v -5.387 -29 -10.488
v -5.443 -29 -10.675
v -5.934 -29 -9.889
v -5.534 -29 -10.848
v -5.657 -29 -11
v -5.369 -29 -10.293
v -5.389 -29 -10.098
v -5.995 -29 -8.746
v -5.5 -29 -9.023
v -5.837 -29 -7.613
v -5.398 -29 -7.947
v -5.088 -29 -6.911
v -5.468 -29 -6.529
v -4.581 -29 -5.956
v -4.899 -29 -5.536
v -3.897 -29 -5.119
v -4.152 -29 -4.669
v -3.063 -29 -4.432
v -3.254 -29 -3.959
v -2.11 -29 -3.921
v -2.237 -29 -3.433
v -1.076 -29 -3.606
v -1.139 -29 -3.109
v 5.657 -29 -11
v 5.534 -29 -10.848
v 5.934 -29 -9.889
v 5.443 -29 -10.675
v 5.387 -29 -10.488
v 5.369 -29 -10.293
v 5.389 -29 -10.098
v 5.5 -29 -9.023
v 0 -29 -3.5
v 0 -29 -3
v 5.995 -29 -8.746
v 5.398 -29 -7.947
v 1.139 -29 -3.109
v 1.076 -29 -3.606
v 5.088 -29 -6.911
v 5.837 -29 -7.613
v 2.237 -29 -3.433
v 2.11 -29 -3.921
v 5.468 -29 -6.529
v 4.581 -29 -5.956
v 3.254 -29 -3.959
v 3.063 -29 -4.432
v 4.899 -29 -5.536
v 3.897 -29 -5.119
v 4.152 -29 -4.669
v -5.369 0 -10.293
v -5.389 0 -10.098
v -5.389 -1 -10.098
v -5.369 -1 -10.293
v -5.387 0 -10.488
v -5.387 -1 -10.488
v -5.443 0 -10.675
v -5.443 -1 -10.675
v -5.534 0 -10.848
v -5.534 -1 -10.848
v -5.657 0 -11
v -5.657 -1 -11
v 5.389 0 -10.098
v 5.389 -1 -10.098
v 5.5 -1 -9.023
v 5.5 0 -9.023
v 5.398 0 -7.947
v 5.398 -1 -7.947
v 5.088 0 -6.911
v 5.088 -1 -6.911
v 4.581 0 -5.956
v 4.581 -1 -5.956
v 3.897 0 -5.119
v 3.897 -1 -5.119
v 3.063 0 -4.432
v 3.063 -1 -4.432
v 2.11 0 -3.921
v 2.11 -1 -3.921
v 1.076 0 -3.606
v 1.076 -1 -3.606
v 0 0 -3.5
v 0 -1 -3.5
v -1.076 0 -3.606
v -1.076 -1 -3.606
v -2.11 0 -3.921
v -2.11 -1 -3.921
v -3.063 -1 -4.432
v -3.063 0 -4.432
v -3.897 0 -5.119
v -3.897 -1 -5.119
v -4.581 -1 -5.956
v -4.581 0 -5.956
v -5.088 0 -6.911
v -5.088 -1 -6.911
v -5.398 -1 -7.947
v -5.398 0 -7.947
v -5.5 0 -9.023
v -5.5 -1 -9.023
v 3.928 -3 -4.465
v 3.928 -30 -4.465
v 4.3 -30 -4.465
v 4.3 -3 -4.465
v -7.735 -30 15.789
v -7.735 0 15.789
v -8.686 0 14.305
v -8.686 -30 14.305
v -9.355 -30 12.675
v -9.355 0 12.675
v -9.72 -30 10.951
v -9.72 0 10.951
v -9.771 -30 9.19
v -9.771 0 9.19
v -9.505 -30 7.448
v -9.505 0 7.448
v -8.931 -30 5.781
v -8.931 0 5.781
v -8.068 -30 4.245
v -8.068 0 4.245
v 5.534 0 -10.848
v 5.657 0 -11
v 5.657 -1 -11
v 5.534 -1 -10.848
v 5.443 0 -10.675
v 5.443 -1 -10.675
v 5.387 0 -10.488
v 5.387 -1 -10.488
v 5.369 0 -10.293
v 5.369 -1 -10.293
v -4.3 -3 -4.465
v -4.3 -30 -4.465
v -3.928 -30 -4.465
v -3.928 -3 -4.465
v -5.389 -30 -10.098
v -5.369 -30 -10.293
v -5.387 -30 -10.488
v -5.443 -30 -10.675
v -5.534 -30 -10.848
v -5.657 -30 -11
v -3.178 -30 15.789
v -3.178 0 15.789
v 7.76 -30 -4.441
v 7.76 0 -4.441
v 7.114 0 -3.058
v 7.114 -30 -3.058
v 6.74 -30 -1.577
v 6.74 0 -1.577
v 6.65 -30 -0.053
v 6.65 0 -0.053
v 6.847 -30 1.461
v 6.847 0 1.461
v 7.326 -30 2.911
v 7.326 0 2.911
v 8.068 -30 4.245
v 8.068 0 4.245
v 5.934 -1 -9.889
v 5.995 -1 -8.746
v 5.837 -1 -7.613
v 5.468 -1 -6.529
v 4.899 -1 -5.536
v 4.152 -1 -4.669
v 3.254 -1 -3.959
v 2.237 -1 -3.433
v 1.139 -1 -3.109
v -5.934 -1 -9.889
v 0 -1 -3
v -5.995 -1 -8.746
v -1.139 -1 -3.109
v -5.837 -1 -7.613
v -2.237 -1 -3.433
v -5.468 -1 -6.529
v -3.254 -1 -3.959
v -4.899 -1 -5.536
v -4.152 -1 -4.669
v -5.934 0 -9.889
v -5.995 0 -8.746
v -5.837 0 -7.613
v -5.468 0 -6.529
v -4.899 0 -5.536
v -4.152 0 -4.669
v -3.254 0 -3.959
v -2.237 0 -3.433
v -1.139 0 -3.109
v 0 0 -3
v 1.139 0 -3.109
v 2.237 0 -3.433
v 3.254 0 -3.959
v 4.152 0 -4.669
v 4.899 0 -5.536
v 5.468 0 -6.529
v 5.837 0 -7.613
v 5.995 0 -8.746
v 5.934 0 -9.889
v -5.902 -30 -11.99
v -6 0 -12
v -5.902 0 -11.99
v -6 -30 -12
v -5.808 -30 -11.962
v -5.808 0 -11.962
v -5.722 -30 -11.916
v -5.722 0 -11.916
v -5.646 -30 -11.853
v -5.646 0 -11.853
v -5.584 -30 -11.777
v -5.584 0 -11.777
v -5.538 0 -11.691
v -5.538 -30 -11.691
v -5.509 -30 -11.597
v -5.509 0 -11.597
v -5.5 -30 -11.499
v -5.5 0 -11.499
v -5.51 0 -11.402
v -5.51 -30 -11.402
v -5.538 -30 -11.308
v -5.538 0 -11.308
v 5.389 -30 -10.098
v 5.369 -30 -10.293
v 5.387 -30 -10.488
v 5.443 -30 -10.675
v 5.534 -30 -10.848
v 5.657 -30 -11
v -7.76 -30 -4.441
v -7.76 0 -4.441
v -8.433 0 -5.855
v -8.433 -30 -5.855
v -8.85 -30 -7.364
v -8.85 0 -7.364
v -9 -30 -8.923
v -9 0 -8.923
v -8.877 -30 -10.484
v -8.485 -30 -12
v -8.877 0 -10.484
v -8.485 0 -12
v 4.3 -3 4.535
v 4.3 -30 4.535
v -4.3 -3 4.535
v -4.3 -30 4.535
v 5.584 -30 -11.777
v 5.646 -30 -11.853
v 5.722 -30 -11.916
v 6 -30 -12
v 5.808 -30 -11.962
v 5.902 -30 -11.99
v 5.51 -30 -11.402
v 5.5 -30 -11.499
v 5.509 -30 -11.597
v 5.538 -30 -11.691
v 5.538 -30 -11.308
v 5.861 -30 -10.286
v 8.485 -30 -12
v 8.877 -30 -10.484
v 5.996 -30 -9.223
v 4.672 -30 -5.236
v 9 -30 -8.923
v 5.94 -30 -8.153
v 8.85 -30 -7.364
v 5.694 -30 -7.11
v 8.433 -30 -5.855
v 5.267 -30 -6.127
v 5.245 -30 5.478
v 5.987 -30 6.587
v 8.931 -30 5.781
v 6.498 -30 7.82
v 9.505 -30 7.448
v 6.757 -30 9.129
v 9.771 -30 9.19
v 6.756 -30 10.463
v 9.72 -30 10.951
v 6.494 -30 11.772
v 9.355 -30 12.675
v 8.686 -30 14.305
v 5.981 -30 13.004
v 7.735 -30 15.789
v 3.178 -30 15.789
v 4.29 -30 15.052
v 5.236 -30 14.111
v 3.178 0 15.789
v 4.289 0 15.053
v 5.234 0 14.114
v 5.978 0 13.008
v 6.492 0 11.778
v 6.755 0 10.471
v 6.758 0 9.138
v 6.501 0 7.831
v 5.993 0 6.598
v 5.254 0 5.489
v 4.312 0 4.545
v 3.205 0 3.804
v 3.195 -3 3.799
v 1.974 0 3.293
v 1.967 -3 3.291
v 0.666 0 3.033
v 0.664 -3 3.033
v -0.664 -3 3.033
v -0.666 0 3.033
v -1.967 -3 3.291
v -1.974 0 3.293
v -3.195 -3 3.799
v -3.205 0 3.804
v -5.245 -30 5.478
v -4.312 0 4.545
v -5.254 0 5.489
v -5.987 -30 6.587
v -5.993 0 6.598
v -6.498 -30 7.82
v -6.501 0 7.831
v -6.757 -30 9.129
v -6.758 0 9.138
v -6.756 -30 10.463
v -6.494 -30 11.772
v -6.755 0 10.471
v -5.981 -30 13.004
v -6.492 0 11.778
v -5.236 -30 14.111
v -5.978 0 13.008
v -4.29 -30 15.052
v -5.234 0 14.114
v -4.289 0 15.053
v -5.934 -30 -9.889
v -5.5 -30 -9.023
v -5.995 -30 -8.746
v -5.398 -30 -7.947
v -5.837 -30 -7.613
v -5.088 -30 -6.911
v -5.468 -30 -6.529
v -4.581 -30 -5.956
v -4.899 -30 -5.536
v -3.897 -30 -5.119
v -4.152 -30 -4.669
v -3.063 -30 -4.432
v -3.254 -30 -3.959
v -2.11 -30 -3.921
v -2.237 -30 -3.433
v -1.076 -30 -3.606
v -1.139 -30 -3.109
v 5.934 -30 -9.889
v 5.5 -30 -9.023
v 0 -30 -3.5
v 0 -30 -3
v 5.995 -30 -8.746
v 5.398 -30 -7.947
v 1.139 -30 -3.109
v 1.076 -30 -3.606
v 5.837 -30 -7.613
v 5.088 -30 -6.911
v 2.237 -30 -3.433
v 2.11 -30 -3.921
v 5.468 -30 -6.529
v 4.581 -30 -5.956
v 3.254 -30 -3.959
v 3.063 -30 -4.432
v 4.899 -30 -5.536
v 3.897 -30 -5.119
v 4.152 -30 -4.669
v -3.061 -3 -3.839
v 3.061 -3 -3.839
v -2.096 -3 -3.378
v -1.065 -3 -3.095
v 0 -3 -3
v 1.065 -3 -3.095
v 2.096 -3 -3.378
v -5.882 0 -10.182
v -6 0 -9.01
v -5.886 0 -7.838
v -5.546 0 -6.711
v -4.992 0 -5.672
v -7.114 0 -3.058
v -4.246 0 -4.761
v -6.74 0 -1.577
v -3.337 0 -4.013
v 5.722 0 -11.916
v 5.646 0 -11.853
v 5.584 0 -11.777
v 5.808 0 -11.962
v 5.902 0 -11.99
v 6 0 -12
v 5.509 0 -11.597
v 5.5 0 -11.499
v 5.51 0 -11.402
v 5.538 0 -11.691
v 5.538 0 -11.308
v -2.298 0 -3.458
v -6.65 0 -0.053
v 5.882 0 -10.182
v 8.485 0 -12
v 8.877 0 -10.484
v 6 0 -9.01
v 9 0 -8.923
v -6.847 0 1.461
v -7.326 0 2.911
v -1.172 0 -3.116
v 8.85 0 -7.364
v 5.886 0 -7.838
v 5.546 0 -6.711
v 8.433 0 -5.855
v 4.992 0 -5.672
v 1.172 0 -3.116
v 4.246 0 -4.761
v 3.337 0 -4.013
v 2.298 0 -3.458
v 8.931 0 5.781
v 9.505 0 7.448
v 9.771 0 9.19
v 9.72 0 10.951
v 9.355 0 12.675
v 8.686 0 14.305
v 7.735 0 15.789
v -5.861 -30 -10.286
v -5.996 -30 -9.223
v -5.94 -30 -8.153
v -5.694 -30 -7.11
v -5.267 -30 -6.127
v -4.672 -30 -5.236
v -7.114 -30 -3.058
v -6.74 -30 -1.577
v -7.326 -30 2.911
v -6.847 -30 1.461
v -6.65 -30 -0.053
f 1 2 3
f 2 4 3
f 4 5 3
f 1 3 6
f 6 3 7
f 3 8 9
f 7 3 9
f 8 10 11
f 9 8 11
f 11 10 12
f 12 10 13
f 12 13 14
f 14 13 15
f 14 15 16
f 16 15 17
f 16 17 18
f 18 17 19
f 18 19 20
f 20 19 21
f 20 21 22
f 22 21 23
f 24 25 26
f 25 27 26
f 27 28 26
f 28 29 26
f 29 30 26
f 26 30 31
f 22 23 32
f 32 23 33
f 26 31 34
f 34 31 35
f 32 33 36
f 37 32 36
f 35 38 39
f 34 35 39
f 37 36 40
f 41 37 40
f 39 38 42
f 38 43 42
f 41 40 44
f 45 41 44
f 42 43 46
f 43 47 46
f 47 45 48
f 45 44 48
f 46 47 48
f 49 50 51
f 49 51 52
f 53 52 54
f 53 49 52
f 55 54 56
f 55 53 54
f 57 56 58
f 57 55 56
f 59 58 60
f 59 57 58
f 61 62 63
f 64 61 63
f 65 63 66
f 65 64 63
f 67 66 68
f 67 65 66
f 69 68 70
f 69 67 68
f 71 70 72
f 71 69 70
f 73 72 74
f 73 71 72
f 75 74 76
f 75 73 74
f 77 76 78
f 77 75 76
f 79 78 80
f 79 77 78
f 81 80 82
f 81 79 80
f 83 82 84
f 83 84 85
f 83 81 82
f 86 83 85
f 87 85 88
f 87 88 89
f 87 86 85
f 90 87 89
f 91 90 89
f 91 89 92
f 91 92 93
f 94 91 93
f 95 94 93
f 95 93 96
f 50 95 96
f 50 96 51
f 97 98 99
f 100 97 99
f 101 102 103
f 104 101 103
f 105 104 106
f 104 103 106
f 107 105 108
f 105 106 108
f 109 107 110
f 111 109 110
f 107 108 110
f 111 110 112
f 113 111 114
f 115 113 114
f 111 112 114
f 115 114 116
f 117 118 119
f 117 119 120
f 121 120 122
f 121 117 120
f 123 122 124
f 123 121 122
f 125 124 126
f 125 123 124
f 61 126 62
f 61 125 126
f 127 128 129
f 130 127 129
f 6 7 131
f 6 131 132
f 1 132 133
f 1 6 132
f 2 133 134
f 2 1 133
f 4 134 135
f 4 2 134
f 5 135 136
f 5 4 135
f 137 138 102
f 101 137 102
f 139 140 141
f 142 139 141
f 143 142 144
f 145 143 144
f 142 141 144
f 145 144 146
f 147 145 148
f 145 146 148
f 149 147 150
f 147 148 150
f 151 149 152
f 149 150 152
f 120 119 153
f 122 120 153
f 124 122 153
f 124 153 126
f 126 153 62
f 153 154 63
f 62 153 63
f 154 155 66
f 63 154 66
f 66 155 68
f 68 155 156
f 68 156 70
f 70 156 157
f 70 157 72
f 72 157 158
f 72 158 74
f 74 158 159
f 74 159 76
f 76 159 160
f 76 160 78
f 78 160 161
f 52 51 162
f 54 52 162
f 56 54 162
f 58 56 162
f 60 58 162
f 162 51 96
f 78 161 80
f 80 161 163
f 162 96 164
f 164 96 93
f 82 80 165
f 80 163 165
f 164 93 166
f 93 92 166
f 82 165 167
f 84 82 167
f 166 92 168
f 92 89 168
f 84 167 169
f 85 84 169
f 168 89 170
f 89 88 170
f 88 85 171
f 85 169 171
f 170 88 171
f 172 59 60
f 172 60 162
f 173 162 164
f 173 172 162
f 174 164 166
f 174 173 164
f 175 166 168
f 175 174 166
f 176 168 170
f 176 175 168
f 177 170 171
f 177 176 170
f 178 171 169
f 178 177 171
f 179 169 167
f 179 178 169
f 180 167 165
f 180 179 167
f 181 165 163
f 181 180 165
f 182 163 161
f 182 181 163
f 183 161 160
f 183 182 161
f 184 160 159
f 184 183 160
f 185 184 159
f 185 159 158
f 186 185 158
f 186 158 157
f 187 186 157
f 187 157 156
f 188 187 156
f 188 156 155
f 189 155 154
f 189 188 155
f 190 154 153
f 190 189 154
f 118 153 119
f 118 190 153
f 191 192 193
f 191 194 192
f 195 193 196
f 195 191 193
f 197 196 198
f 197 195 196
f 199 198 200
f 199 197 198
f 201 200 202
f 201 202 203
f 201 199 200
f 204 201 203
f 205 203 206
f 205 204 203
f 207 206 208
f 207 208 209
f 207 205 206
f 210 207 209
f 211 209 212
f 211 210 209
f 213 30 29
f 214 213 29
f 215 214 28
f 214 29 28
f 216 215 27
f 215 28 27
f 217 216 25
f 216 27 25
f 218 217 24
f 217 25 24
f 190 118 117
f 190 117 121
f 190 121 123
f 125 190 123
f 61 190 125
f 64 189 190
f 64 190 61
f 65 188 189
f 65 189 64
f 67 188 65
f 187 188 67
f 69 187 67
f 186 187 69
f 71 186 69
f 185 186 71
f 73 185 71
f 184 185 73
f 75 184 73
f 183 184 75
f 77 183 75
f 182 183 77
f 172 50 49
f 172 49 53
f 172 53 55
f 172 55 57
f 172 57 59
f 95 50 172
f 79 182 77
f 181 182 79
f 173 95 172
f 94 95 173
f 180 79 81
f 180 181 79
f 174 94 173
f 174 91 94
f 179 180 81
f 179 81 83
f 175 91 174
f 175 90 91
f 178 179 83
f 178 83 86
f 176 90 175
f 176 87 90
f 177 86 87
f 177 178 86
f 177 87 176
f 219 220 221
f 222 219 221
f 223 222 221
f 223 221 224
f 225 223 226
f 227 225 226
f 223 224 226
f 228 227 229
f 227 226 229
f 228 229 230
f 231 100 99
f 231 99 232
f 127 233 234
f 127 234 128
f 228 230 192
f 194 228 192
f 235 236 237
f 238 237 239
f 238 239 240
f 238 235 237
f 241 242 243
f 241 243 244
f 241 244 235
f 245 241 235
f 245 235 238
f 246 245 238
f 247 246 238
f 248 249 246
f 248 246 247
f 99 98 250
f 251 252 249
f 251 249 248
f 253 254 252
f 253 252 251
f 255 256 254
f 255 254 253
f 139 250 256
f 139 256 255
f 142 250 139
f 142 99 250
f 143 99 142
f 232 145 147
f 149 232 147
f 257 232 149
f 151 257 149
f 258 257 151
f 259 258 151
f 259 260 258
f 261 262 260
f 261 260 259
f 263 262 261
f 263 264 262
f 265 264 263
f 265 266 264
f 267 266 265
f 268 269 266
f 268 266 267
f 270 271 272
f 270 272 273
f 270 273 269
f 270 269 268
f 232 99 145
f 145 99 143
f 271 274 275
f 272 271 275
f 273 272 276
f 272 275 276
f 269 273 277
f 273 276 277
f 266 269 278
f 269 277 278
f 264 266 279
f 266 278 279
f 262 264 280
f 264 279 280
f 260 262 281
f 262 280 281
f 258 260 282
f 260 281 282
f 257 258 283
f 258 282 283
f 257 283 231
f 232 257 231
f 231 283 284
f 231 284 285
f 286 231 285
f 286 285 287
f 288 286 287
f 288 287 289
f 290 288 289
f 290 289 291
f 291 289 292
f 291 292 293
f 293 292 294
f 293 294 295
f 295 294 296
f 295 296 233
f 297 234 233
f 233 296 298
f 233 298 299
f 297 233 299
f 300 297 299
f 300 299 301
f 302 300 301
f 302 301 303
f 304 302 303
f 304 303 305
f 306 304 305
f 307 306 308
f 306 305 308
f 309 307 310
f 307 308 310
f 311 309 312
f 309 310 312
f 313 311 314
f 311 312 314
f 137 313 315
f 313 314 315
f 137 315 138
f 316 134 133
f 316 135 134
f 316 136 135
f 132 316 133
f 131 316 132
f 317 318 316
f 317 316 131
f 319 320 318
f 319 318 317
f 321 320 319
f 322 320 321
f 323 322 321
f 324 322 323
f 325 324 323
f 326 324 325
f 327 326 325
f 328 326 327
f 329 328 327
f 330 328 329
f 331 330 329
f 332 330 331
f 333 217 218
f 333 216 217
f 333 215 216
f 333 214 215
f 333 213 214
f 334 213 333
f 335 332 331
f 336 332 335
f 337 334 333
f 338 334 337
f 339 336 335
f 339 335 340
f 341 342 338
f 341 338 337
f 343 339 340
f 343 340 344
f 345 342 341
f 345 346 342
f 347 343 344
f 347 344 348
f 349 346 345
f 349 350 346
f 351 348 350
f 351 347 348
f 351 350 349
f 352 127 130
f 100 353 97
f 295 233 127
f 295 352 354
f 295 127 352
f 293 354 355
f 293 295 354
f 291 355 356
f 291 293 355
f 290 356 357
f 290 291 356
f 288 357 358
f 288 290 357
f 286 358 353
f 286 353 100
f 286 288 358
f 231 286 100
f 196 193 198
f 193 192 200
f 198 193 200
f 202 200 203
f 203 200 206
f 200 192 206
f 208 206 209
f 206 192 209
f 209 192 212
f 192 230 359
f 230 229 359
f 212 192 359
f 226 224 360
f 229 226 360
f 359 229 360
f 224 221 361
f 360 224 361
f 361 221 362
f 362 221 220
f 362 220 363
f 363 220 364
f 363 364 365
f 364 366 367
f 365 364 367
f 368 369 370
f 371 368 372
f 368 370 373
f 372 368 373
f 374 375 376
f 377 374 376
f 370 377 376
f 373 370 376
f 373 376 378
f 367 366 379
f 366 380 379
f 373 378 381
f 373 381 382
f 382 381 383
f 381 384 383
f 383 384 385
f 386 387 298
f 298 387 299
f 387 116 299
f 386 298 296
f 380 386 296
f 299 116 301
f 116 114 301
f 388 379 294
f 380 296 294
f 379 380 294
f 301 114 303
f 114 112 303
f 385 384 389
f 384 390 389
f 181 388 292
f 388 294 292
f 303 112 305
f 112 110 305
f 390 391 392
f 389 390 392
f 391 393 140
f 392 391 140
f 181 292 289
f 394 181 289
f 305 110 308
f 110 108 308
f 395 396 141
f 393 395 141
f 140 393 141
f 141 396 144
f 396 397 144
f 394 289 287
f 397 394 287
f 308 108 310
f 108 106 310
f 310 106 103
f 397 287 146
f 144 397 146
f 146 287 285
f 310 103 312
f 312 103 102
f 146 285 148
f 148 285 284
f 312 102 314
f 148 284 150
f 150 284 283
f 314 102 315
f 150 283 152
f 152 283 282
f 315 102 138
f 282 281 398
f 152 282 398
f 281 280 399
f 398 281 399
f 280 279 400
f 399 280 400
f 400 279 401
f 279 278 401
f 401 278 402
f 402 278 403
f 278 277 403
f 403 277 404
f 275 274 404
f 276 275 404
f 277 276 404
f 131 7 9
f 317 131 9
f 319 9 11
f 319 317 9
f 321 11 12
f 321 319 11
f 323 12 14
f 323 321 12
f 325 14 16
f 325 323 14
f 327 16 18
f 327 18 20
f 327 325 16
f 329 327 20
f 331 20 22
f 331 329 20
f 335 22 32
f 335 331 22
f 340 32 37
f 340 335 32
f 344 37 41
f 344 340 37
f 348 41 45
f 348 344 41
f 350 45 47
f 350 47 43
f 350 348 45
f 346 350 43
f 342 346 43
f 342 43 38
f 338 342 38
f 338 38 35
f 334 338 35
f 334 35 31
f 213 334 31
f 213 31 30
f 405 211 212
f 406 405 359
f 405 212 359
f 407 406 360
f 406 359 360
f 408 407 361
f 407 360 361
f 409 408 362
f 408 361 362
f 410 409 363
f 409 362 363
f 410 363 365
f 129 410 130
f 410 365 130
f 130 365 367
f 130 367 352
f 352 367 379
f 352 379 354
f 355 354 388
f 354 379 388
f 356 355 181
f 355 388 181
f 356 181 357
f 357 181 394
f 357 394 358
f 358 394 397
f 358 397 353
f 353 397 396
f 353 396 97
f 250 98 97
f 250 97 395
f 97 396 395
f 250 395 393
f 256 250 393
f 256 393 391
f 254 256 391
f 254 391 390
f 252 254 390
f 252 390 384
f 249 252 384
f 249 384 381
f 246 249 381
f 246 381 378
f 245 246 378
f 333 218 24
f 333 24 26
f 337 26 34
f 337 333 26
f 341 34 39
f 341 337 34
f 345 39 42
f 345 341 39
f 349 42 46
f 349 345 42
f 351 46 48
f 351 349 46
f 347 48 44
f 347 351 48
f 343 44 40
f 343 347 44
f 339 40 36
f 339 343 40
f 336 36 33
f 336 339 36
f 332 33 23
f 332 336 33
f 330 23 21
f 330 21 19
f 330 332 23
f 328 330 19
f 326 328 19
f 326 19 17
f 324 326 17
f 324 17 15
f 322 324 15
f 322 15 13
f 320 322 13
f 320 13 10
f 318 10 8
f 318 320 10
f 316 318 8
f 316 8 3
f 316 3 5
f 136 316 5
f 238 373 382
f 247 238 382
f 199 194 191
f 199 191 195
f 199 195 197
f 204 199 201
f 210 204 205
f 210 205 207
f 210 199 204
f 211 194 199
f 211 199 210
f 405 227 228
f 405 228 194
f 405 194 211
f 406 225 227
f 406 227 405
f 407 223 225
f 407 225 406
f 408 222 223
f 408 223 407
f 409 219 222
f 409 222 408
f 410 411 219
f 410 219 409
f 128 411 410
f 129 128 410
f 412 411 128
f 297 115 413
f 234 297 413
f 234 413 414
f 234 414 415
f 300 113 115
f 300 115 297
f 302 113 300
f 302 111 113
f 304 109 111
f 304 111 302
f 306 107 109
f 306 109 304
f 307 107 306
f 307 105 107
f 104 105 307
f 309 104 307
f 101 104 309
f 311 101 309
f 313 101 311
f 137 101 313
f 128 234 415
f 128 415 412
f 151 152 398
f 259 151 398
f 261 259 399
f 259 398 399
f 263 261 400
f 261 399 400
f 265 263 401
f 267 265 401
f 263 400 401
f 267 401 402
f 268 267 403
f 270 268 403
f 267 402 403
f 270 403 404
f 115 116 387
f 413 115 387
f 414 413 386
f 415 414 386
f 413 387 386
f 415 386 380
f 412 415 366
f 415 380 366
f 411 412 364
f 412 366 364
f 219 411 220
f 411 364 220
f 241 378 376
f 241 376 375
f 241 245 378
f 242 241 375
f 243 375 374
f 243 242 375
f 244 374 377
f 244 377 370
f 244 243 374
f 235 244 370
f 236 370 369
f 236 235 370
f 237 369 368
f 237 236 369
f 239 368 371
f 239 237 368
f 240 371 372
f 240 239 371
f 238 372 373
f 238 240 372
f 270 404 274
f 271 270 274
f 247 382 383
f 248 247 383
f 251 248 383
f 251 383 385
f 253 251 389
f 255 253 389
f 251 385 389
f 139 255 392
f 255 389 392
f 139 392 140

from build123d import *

# Parameters (mm, degrees)
F1_DEPTH      = 30
F3_DEPTH      = 27
F5_DEPTH      = 1
F7_DEPTH      = 1
F8_T1_DEPTH   = 5.7000067135
F8_2_T1_DEPTH = 5.7000067135
F9_R          = 0.5


# Not quite as in the source:
# - a fillet or chamfer that OpenCascade refuses, or shapes differently, is made with other operations: its cross-section is extruded or revolved along the edge and cut away or added


with BuildPart() as f1:
    # F0 (on Front) → F1 (new body)
    with BuildSketch(Plane.XZ):
        with BuildLine():
            ThreePointArc((3.1776069014, 15.7894908219), (0, 3), (-3.1776069014, 15.7894908219))
            Line((-3.1776069014, 15.7894908219), (-7.7352524556, 15.7894908219))
            ThreePointArc((-7.7352524556, 15.7894908219), (-9.7854255442, 10.0715856127), (-8.0680556753, 4.245069466))
            ThreePointArc((-8.0680556753, 4.245069466), (-6.6495163105, -0.0531637642), (-7.7599288431, -4.4411071136))
            ThreePointArc((-7.7599288431, -4.4411071136), (-8.9588464195, -8.1403077112), (-8.4852813742, -12))
            Line((-8.4852813742, -12), (-5.1961524227, -12))
            ThreePointArc((-5.1961524227, -12), (0, -3), (5.1961524227, -12))
            Line((5.1961524227, -12), (8.4852813742, -12))
            ThreePointArc((8.4852813742, -12), (8.9588464195, -8.1403077112), (7.7599288431, -4.4411071136))
            ThreePointArc((7.7599288431, -4.4411071136), (6.6495163105, -0.0531637642), (8.0680556753, 4.245069466))
            ThreePointArc((8.0680556753, 4.245069466), (9.7854255442, 10.0715856127), (7.7352524556, 15.7894908219))
            Line((7.7352524556, 15.7894908219), (3.1776069014, 15.7894908219))
        make_face()
    extrude(amount=F1_DEPTH)

    # F2 (on face) → F3 (cut)
    with BuildSketch(Plane.XZ.offset(30)):
        with BuildLine():
            ThreePointArc((4.3, 4.535236772), (0, 3), (-4.3, 4.535236772))
            Line((-4.3, 4.535236772), (-4.3, -4.464763228))
            Line((-4.3, -4.464763228), (4.3, -4.464763228))
            Line((4.3, -4.464763228), (4.3, 4.535236772))
        make_face()
    extrude(amount=-F3_DEPTH, mode=Mode.SUBTRACT)

    # F9
    f9_edges = [f1.edges().sort_by_distance(p)[0] for p in [
        (5.196152, -15, -12),
        (-5.196152, -15, -12),
    ]]
    fillet(f9_edges, radius=F9_R)


with BuildPart() as f5:
    # F4 (on face) → F5 (new body)
    with BuildSketch(Plane.XZ.offset(30)):
        with BuildLine():
            Line((5.123475383, -11), (5.6568542495, -11))
            ThreePointArc((5.6568542495, -11), (0, -3), (-5.6568542495, -11))
            Line((-5.6568542495, -11), (-5.123475383, -11))
            ThreePointArc((-5.123475383, -11), (0, -3.5), (5.123475383, -11))
        make_face()
    extrude(amount=-F5_DEPTH)

    # F8: fillet of radius 1 on 2 edges, made by hand

    # F8_s2 → F8_t1 (cut)
    with BuildSketch(Plane.XZ.offset(26.6499966433)):
        with BuildLine():
            ThreePointArc((5.3892153407, -10.0983433031), (5.4104140841, -10.5826008761), (5.6568542495, -11))
            Line((5.6568542495, -11), (5.123475383, -11))
            ThreePointArc((5.123475383, -11), (5.2756433506, -10.5548592339), (5.3892153407, -10.0983433031))
        make_face()
        with BuildLine():
            ThreePointArc((-5.3892153407, -10.0983433031), (-5.4104140841, -10.5826008761), (-5.6568542495, -11))
            Line((-5.6568542495, -11), (-5.123475383, -11))
            ThreePointArc((-5.123475383, -11), (-5.2756433506, -10.5548592339), (-5.3892153407, -10.0983433031))
        make_face()
    extrude(amount=F8_T1_DEPTH, mode=Mode.SUBTRACT)


with BuildPart() as f7:
    # F6 (on face) → F7 (new body)
    with BuildSketch(Plane(origin=(0, 0, 0), x_dir=(-1, 0, 0), z_dir=(0, 1, 0))):
        with BuildLine():
            ThreePointArc((5.6568542495, -11), (0, -3), (-5.6568542495, -11))
            Line((-5.6568542495, -11), (-5.123475383, -11))
            ThreePointArc((-5.123475383, -11), (0, -3.5), (5.123475383, -11))
            Line((5.123475383, -11), (5.6568542495, -11))
        make_face()
    extrude(amount=-F7_DEPTH)

    # F8#2: fillet of radius 1 on 2 edges, made by hand

    # F8_2_s2 → F8_2_t1 (cut)
    with BuildSketch(Plane.XZ.offset(-2.3500033567)):
        with BuildLine():
            ThreePointArc((5.6568542495, -11), (5.4104140841, -10.5826008761), (5.3892153407, -10.0983433031))
            ThreePointArc((5.3892153407, -10.0983433031), (5.2756433506, -10.5548592339), (5.123475383, -11))
            Line((5.123475383, -11), (5.6568542495, -11))
        make_face()
        with BuildLine():
            ThreePointArc((-5.3892153407, -10.0983433031), (-5.4104140841, -10.5826008761), (-5.6568542495, -11))
            Line((-5.6568542495, -11), (-5.123475383, -11))
            ThreePointArc((-5.123475383, -11), (-5.2756433506, -10.5548592339), (-5.3892153407, -10.0983433031))
        make_face()
    extrude(amount=F8_2_T1_DEPTH, mode=Mode.SUBTRACT)


solid = Compound([f1.part, f5.part, f7.part])
